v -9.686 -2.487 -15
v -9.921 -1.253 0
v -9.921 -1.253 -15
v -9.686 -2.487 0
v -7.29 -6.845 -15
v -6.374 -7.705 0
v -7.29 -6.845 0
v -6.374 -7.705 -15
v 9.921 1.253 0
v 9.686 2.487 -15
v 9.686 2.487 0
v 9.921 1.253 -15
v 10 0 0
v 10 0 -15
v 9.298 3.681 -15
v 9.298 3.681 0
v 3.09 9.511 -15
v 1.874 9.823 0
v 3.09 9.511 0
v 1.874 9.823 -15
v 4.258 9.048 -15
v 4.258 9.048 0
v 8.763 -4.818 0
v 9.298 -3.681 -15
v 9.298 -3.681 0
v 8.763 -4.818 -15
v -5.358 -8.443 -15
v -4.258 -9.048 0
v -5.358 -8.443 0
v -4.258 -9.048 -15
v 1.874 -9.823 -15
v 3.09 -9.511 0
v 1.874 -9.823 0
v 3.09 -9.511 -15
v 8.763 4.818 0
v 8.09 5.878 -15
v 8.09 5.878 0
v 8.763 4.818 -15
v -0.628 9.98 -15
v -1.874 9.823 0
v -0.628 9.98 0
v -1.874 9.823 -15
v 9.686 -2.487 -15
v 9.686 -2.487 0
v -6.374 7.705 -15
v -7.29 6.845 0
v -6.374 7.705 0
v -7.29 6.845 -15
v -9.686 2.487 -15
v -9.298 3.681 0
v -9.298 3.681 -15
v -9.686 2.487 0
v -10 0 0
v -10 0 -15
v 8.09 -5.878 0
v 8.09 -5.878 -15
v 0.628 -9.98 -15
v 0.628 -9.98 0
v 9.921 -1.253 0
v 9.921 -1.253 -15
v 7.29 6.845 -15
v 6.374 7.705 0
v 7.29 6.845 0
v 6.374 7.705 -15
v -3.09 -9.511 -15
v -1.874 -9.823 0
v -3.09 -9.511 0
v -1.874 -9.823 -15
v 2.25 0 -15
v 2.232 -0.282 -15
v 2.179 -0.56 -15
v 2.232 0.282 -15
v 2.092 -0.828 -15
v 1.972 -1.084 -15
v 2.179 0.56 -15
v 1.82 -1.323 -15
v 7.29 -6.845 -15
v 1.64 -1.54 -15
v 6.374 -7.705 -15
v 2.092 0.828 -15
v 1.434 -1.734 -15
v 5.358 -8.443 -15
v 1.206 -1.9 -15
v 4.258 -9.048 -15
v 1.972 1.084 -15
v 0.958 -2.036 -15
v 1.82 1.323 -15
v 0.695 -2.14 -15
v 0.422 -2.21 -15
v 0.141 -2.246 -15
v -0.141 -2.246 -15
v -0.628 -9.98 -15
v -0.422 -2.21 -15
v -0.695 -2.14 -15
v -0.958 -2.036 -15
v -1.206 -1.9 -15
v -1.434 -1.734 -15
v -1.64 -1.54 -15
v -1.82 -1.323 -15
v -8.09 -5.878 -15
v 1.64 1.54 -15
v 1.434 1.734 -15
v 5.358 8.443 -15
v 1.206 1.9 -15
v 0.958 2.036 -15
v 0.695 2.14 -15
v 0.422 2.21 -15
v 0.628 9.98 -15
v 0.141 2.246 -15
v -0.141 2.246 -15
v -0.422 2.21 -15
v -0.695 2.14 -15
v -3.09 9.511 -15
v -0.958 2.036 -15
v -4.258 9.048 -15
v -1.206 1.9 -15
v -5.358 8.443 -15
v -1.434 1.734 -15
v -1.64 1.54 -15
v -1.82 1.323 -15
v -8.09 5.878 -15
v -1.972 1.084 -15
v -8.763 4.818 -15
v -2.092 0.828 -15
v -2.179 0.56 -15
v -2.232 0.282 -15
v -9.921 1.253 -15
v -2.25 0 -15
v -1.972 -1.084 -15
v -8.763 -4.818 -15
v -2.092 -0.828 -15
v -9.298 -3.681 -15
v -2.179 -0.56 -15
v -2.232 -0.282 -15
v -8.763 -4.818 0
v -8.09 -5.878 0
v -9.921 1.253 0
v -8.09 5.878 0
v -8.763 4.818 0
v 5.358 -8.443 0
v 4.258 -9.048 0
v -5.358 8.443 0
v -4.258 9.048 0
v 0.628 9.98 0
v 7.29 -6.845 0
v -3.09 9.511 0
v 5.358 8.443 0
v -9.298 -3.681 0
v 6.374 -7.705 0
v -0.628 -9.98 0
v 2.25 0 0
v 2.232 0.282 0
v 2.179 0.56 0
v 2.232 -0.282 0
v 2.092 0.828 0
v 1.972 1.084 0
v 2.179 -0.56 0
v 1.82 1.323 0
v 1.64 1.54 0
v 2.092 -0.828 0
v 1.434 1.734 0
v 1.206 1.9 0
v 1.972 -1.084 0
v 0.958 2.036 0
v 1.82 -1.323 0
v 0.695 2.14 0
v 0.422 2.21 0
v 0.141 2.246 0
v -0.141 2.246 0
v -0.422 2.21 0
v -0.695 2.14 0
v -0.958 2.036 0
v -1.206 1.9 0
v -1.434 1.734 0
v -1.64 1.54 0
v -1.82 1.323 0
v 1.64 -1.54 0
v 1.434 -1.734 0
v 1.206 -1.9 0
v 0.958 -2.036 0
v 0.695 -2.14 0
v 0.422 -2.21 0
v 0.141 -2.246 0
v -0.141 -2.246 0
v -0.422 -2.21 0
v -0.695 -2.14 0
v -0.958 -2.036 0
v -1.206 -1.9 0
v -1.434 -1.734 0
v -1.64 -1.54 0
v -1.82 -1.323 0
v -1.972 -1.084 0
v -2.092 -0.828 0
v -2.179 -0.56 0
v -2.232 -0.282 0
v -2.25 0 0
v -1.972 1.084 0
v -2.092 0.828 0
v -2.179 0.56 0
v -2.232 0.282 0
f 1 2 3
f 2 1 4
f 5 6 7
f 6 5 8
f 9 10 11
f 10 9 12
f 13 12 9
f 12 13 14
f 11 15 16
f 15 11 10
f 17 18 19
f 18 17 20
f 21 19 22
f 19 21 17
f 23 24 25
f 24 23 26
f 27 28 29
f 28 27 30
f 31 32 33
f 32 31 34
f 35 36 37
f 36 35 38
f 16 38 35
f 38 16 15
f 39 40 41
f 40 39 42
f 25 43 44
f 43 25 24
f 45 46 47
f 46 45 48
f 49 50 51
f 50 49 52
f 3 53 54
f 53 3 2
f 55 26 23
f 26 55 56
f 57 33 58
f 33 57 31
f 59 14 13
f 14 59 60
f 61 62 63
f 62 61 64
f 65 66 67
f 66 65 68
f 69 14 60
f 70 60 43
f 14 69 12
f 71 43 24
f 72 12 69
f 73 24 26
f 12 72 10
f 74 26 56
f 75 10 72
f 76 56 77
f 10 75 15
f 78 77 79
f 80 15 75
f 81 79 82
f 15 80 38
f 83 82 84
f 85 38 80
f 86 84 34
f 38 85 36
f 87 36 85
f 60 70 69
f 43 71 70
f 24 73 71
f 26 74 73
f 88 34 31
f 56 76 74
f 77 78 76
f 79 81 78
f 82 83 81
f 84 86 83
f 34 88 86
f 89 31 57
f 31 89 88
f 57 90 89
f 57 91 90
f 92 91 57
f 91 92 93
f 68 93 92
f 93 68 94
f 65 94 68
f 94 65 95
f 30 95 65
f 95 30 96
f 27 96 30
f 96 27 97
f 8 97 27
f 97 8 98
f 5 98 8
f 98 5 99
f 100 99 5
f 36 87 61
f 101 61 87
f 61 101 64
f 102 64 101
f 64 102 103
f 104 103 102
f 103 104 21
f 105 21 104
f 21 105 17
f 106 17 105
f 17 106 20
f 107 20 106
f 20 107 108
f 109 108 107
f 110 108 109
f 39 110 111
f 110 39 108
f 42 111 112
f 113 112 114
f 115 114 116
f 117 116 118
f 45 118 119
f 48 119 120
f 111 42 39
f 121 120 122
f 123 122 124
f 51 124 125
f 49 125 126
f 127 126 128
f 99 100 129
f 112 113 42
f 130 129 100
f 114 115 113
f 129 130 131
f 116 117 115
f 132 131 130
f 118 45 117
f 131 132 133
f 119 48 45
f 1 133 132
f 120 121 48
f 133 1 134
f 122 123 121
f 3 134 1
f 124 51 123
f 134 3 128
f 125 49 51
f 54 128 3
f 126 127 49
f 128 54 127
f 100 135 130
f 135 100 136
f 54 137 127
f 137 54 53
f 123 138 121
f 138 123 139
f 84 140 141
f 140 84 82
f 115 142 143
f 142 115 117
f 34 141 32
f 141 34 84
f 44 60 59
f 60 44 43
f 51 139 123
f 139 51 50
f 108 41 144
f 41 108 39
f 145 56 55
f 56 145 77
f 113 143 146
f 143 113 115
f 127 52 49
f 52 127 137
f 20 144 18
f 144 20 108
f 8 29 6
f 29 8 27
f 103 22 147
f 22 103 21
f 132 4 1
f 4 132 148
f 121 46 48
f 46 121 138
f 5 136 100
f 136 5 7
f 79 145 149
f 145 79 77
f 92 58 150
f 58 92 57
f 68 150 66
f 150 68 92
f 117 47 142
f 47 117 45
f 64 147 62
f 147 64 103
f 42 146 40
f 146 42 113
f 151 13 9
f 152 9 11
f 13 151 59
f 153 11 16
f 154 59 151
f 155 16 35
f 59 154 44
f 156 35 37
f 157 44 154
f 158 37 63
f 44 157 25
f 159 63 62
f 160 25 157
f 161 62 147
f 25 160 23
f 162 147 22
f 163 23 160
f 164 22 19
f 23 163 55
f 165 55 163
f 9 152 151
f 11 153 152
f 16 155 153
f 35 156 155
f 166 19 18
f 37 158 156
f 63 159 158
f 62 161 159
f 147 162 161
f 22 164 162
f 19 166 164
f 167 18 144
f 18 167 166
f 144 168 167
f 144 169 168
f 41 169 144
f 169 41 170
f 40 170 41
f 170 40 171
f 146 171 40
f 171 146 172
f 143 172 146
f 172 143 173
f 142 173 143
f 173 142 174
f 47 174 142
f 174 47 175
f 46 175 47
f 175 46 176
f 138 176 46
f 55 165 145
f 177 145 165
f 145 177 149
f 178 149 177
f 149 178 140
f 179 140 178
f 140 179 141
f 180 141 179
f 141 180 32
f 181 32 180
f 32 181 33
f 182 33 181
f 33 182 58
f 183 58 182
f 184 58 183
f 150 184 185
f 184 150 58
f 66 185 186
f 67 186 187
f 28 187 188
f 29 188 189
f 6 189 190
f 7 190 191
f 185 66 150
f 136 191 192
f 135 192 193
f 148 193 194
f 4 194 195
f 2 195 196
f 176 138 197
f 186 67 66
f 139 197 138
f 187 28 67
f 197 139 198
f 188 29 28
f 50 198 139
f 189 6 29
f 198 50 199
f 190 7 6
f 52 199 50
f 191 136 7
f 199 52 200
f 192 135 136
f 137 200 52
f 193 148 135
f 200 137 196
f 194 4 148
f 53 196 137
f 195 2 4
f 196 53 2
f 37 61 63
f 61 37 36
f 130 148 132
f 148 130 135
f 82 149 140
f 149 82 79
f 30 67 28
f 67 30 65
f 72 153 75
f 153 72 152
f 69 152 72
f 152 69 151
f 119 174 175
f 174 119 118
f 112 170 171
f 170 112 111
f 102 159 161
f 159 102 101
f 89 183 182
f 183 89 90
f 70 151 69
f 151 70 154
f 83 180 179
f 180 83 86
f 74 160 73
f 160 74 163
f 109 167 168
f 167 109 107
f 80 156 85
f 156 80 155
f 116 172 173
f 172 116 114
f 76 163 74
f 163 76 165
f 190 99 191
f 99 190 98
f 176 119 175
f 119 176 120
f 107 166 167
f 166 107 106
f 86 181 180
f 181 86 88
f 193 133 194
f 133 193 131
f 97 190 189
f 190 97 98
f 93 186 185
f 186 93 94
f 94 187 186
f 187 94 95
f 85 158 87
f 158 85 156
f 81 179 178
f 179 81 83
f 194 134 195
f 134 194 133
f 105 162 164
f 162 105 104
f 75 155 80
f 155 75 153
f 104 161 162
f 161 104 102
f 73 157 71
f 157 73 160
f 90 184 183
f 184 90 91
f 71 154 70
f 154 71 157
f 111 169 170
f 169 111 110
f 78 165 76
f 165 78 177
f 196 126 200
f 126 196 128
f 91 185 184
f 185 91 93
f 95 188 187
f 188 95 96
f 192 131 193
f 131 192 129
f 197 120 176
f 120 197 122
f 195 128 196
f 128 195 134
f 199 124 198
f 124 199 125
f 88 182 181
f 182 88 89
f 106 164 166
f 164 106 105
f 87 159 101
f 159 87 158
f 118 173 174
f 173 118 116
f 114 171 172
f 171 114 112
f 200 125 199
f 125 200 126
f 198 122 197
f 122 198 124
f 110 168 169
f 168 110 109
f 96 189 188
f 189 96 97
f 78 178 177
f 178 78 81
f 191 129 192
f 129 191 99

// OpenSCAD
$fn = 50;


difference() {
	union() {
		translate(v = [0, 0, -15.0000000000]) {
			cylinder(h = 15, r = 10.0000000000);
		}
		cylinder(h = 0, r = 16.0000000000);
	}
	union() {
		#translate(v = [0, 0, -15]) {
			cylinder(h = 15, r = 2.2500000000);
		}
	}
}
